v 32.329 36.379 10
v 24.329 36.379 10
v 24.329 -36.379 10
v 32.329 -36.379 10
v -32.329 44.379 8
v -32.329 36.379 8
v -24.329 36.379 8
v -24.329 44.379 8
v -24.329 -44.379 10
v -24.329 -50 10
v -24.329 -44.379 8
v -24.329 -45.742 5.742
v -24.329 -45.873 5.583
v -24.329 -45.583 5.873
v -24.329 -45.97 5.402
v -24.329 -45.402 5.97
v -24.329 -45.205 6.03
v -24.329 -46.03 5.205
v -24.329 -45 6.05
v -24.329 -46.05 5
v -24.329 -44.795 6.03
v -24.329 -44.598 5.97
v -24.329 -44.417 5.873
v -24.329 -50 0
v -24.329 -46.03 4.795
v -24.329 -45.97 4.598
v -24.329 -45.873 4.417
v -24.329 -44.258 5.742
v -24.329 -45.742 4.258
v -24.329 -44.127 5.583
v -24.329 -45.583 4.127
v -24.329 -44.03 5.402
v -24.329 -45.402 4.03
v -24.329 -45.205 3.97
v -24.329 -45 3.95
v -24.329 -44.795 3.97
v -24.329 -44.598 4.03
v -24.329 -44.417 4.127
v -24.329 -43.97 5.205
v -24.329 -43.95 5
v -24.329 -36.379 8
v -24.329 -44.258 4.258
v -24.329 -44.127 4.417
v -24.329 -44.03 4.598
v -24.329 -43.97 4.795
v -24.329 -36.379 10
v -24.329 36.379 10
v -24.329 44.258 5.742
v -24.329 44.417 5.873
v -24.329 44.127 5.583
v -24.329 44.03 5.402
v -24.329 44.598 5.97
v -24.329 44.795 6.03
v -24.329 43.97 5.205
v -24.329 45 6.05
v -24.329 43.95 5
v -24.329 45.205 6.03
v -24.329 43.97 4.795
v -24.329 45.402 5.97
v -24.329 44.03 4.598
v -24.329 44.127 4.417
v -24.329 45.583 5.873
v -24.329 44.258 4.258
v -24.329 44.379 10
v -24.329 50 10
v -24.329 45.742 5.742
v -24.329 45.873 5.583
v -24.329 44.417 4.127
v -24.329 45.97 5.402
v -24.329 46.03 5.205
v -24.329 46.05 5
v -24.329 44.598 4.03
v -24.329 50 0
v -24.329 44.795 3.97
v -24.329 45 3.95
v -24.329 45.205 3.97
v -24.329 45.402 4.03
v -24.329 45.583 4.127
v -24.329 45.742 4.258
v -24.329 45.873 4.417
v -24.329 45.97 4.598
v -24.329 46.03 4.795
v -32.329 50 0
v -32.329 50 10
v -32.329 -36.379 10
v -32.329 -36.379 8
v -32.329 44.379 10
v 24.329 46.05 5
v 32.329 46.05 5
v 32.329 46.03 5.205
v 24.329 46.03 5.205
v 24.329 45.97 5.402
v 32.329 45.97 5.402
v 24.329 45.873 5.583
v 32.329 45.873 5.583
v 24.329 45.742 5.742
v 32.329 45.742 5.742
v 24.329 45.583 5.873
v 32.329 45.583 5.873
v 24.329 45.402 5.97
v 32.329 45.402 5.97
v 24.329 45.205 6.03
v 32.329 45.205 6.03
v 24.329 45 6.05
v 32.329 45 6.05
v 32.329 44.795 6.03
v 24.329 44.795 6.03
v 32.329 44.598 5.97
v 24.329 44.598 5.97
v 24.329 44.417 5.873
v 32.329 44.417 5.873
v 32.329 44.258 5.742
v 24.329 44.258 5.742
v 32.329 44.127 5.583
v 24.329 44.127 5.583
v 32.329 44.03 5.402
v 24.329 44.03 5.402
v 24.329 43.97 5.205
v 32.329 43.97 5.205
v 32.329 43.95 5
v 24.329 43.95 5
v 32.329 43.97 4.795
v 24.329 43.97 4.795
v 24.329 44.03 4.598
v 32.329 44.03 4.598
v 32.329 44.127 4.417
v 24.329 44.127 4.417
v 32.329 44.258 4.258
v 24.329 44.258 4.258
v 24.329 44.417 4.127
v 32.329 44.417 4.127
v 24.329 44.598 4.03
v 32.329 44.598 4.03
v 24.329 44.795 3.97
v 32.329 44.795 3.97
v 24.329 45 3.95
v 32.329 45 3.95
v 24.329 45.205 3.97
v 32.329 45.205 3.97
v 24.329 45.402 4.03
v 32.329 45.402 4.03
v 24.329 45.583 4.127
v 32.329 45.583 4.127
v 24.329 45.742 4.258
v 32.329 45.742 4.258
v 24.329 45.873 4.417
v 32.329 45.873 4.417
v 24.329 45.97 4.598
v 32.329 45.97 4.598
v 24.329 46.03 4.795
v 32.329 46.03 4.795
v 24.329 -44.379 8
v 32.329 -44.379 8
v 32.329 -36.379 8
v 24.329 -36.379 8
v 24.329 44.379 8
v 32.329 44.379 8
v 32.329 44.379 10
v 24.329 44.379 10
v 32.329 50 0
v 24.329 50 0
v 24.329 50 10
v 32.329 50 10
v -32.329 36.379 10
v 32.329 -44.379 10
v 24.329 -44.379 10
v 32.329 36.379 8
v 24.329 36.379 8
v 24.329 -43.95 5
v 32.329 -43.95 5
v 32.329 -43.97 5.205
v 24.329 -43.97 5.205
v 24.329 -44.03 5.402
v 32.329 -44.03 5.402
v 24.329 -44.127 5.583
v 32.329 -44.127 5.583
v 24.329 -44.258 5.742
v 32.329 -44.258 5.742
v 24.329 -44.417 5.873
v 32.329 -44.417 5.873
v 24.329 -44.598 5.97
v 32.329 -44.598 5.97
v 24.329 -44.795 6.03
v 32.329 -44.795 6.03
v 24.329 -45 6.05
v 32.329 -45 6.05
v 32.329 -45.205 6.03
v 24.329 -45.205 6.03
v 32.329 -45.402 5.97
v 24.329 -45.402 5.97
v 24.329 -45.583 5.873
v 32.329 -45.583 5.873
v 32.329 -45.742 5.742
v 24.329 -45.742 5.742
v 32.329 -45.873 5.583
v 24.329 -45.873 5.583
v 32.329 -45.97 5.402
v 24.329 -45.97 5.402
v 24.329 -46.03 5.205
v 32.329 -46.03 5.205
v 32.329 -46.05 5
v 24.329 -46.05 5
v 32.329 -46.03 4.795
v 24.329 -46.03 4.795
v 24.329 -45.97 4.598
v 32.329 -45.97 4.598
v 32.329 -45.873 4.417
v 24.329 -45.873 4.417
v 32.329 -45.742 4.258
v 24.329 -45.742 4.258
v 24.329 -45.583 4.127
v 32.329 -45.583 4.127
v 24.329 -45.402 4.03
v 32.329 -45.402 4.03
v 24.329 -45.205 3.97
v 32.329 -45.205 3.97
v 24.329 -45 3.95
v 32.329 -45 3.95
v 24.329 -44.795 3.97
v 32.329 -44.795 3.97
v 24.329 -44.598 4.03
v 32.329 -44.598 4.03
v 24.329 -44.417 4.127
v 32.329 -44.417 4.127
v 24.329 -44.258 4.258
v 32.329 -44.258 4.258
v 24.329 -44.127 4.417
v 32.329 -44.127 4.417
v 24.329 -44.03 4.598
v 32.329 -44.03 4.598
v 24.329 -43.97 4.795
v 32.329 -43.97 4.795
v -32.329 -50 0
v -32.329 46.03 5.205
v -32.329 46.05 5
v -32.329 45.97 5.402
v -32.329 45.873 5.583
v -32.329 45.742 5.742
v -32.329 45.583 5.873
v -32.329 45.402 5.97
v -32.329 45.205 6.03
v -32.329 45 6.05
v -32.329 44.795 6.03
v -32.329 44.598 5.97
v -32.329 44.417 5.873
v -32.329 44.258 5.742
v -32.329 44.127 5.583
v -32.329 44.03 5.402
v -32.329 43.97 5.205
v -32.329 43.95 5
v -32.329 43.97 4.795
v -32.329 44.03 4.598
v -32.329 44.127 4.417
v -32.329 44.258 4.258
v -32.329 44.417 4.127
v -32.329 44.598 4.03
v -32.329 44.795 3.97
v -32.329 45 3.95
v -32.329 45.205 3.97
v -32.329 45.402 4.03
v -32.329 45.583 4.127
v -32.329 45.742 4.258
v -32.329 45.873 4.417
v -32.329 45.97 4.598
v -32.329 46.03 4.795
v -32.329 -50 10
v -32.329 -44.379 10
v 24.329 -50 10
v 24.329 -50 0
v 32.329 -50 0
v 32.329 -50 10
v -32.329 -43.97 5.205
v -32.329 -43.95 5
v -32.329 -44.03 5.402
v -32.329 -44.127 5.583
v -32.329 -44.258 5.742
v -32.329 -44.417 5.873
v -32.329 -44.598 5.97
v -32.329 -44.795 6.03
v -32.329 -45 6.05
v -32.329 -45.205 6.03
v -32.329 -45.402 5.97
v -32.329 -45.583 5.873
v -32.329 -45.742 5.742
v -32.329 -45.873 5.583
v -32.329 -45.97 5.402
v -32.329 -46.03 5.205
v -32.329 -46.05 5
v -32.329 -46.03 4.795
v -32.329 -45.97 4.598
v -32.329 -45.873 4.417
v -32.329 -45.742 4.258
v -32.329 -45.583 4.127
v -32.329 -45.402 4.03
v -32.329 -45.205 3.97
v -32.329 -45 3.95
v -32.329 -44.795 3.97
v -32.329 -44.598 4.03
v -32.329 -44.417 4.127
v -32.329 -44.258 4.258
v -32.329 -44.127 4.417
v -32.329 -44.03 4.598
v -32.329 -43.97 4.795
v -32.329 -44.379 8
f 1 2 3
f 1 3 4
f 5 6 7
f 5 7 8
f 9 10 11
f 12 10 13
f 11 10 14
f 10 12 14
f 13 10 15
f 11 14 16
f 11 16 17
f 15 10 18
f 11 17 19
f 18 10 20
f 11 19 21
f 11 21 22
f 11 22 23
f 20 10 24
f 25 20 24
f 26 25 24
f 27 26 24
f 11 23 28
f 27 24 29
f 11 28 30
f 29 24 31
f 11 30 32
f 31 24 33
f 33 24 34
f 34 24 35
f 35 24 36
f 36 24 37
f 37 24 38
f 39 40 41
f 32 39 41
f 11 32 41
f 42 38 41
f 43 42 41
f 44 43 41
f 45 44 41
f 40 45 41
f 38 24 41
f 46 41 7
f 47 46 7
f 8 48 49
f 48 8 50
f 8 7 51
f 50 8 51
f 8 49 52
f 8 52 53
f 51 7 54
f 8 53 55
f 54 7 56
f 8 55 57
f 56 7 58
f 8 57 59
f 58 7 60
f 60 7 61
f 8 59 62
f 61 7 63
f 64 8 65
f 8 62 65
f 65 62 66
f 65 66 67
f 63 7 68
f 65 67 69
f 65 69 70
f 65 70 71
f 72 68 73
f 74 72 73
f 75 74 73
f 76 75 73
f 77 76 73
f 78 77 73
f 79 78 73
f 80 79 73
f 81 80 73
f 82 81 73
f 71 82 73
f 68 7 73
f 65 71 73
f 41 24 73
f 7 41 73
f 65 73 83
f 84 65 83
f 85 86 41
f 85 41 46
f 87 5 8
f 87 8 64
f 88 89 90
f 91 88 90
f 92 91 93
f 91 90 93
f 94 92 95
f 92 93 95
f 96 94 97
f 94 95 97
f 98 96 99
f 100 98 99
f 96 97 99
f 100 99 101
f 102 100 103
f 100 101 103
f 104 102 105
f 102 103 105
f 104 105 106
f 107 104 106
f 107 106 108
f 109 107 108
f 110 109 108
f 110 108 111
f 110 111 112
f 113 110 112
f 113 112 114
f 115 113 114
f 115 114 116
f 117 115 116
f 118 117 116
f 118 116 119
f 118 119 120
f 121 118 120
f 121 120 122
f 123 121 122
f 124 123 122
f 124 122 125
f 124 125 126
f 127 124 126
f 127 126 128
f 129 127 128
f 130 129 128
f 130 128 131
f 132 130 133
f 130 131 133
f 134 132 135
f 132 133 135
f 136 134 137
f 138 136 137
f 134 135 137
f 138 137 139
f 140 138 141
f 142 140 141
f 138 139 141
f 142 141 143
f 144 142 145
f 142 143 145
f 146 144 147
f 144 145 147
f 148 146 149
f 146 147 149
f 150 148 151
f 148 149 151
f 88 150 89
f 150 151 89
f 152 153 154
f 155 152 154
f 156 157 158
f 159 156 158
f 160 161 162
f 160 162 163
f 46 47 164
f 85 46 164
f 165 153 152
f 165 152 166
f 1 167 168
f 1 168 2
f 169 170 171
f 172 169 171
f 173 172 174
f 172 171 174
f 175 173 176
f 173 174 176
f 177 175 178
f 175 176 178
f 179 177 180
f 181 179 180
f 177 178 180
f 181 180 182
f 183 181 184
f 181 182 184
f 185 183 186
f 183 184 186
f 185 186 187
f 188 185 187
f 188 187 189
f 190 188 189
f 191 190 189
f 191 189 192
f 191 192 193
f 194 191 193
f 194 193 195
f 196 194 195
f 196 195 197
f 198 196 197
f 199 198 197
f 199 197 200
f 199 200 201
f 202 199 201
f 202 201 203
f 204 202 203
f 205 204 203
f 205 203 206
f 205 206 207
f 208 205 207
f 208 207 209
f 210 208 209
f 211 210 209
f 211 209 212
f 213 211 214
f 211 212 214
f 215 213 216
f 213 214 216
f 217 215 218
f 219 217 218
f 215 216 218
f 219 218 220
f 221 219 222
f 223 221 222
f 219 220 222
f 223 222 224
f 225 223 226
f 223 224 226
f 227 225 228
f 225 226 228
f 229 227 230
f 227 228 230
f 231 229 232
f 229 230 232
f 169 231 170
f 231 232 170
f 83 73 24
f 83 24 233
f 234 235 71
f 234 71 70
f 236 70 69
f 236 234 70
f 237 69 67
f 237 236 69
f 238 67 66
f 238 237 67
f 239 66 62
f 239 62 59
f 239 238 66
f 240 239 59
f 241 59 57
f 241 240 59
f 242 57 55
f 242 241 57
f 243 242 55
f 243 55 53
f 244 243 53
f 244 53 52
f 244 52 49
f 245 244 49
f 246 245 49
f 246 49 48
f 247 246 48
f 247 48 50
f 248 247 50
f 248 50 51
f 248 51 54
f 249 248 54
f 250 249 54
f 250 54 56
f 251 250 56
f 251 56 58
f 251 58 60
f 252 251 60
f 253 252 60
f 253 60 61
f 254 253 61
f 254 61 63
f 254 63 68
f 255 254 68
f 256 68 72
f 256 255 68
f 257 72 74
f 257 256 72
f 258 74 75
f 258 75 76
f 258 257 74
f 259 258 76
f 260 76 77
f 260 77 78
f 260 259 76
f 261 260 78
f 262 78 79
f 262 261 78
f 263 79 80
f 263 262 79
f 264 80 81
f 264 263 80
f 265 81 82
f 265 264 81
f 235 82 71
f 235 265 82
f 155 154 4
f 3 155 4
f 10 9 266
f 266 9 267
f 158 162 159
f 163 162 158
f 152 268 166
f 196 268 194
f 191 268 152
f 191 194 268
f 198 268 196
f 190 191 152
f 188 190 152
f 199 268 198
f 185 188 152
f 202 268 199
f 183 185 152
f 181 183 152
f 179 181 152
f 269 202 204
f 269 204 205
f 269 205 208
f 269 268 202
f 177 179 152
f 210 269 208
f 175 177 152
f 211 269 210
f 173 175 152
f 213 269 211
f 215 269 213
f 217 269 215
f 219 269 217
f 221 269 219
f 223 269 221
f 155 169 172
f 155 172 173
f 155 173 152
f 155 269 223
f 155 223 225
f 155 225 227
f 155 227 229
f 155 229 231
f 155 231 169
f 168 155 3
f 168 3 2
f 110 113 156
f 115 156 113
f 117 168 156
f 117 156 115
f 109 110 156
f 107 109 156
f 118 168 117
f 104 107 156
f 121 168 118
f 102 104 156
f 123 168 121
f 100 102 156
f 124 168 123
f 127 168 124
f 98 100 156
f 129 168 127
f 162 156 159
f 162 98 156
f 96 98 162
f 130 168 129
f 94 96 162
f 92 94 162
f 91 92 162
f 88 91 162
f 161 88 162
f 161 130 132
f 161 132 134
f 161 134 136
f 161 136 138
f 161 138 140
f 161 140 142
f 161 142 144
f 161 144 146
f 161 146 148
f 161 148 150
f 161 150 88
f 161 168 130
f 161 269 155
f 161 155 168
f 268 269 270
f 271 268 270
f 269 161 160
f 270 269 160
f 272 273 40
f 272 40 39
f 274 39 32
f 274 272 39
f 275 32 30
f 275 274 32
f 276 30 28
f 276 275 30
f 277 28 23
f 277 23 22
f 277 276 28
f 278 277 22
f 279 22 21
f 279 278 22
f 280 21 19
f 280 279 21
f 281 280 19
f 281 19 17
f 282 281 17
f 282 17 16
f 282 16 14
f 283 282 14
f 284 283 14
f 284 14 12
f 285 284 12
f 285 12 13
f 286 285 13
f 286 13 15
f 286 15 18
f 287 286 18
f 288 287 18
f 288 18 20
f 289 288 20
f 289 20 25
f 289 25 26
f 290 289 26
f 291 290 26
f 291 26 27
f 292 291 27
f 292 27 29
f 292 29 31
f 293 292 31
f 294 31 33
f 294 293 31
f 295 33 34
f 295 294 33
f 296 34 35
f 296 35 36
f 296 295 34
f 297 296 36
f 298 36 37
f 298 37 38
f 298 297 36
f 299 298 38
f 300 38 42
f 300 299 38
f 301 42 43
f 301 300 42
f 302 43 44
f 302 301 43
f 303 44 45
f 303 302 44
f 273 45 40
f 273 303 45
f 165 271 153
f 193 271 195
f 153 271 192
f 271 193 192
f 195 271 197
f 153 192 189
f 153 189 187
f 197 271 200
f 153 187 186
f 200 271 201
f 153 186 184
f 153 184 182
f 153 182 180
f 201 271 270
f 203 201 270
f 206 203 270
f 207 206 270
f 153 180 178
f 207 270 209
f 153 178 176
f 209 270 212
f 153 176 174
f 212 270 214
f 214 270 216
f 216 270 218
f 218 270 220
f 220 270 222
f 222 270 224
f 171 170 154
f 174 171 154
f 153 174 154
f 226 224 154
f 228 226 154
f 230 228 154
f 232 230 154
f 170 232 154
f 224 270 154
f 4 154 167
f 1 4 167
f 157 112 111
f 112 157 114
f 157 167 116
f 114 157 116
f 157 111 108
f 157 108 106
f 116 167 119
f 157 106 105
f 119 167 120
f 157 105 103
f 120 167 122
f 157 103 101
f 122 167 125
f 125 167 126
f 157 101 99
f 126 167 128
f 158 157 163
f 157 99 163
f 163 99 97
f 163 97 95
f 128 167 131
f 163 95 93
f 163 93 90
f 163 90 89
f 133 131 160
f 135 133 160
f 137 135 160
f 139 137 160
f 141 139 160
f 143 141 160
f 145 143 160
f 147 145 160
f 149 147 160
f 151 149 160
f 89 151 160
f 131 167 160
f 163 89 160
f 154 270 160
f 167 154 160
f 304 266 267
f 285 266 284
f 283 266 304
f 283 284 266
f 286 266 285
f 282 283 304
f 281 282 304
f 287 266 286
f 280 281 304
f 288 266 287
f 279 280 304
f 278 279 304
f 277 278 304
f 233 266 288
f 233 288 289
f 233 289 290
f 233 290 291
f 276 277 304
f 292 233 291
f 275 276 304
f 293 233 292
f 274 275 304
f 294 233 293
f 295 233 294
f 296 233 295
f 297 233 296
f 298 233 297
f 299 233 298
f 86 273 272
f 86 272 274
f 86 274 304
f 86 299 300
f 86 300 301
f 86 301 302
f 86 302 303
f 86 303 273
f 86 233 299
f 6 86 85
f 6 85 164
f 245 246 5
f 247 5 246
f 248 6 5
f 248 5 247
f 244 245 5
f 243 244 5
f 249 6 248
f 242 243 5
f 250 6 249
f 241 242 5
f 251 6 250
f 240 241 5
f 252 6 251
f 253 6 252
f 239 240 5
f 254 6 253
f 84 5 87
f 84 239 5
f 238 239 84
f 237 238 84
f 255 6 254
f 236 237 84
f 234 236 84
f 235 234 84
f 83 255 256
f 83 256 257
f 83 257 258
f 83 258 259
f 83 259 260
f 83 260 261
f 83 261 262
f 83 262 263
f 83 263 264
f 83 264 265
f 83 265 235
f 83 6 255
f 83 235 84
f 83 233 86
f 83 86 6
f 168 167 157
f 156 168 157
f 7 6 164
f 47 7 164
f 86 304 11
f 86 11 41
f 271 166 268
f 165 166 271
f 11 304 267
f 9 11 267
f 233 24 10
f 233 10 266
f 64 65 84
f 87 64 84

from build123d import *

# Parameters (mm, degrees)
F0_W     = 8
F0_H     = 100
F1_DEPTH = 10
F2_R     = 1.05
F2_W     = 8
F2_H     = 4
F3_DEPTH = 64.6597103341


with BuildPart() as f1:
    # F0 (on Top) → F1 (new body)
    with BuildSketch(Plane.XY):
        with Locations((-28.329355167, 0)):
            Rectangle(F0_W, F0_H)
    extrude(amount=F1_DEPTH)


with BuildPart() as f1b:
    # F0 (on Top) → F1, piece 2 (new body)
    with BuildSketch(Plane.XY):
        with Locations((28.329355167, 0)):
            Rectangle(F0_W, F0_H)
    extrude(amount=F1_DEPTH)


with BuildPart() as f3_tool:
    # F2 (on face) → F3 (new body, through all)
    with BuildSketch(Plane.YZ.offset(32.329355167)):
        with Locations((45, 5)):
            Circle(F2_R)
        with Locations((-45, 5)):
            Circle(F2_R)
        with Locations((40.3785482049, 10)):
            Rectangle(F2_W, F2_H)
        with Locations((-40.3785482049, 10)):
            Rectangle(F2_W, F2_H)
    extrude(amount=-F3_DEPTH)


with BuildPart() as f1_1:
    add(f1.part)

    # F3: cut by f3_tool
    add(f3_tool.part, mode=Mode.SUBTRACT)


with BuildPart() as f1b_1:
    add(f1b.part)

    # F3: cut by f3_tool
    add(f3_tool.part, mode=Mode.SUBTRACT)


with BuildPart() as f5_1:
    # F5: instance of F1b
    add(f1b_1.part.mirror(Plane.YZ))


solid = Compound([f1b_1.part, f5_1.part])
